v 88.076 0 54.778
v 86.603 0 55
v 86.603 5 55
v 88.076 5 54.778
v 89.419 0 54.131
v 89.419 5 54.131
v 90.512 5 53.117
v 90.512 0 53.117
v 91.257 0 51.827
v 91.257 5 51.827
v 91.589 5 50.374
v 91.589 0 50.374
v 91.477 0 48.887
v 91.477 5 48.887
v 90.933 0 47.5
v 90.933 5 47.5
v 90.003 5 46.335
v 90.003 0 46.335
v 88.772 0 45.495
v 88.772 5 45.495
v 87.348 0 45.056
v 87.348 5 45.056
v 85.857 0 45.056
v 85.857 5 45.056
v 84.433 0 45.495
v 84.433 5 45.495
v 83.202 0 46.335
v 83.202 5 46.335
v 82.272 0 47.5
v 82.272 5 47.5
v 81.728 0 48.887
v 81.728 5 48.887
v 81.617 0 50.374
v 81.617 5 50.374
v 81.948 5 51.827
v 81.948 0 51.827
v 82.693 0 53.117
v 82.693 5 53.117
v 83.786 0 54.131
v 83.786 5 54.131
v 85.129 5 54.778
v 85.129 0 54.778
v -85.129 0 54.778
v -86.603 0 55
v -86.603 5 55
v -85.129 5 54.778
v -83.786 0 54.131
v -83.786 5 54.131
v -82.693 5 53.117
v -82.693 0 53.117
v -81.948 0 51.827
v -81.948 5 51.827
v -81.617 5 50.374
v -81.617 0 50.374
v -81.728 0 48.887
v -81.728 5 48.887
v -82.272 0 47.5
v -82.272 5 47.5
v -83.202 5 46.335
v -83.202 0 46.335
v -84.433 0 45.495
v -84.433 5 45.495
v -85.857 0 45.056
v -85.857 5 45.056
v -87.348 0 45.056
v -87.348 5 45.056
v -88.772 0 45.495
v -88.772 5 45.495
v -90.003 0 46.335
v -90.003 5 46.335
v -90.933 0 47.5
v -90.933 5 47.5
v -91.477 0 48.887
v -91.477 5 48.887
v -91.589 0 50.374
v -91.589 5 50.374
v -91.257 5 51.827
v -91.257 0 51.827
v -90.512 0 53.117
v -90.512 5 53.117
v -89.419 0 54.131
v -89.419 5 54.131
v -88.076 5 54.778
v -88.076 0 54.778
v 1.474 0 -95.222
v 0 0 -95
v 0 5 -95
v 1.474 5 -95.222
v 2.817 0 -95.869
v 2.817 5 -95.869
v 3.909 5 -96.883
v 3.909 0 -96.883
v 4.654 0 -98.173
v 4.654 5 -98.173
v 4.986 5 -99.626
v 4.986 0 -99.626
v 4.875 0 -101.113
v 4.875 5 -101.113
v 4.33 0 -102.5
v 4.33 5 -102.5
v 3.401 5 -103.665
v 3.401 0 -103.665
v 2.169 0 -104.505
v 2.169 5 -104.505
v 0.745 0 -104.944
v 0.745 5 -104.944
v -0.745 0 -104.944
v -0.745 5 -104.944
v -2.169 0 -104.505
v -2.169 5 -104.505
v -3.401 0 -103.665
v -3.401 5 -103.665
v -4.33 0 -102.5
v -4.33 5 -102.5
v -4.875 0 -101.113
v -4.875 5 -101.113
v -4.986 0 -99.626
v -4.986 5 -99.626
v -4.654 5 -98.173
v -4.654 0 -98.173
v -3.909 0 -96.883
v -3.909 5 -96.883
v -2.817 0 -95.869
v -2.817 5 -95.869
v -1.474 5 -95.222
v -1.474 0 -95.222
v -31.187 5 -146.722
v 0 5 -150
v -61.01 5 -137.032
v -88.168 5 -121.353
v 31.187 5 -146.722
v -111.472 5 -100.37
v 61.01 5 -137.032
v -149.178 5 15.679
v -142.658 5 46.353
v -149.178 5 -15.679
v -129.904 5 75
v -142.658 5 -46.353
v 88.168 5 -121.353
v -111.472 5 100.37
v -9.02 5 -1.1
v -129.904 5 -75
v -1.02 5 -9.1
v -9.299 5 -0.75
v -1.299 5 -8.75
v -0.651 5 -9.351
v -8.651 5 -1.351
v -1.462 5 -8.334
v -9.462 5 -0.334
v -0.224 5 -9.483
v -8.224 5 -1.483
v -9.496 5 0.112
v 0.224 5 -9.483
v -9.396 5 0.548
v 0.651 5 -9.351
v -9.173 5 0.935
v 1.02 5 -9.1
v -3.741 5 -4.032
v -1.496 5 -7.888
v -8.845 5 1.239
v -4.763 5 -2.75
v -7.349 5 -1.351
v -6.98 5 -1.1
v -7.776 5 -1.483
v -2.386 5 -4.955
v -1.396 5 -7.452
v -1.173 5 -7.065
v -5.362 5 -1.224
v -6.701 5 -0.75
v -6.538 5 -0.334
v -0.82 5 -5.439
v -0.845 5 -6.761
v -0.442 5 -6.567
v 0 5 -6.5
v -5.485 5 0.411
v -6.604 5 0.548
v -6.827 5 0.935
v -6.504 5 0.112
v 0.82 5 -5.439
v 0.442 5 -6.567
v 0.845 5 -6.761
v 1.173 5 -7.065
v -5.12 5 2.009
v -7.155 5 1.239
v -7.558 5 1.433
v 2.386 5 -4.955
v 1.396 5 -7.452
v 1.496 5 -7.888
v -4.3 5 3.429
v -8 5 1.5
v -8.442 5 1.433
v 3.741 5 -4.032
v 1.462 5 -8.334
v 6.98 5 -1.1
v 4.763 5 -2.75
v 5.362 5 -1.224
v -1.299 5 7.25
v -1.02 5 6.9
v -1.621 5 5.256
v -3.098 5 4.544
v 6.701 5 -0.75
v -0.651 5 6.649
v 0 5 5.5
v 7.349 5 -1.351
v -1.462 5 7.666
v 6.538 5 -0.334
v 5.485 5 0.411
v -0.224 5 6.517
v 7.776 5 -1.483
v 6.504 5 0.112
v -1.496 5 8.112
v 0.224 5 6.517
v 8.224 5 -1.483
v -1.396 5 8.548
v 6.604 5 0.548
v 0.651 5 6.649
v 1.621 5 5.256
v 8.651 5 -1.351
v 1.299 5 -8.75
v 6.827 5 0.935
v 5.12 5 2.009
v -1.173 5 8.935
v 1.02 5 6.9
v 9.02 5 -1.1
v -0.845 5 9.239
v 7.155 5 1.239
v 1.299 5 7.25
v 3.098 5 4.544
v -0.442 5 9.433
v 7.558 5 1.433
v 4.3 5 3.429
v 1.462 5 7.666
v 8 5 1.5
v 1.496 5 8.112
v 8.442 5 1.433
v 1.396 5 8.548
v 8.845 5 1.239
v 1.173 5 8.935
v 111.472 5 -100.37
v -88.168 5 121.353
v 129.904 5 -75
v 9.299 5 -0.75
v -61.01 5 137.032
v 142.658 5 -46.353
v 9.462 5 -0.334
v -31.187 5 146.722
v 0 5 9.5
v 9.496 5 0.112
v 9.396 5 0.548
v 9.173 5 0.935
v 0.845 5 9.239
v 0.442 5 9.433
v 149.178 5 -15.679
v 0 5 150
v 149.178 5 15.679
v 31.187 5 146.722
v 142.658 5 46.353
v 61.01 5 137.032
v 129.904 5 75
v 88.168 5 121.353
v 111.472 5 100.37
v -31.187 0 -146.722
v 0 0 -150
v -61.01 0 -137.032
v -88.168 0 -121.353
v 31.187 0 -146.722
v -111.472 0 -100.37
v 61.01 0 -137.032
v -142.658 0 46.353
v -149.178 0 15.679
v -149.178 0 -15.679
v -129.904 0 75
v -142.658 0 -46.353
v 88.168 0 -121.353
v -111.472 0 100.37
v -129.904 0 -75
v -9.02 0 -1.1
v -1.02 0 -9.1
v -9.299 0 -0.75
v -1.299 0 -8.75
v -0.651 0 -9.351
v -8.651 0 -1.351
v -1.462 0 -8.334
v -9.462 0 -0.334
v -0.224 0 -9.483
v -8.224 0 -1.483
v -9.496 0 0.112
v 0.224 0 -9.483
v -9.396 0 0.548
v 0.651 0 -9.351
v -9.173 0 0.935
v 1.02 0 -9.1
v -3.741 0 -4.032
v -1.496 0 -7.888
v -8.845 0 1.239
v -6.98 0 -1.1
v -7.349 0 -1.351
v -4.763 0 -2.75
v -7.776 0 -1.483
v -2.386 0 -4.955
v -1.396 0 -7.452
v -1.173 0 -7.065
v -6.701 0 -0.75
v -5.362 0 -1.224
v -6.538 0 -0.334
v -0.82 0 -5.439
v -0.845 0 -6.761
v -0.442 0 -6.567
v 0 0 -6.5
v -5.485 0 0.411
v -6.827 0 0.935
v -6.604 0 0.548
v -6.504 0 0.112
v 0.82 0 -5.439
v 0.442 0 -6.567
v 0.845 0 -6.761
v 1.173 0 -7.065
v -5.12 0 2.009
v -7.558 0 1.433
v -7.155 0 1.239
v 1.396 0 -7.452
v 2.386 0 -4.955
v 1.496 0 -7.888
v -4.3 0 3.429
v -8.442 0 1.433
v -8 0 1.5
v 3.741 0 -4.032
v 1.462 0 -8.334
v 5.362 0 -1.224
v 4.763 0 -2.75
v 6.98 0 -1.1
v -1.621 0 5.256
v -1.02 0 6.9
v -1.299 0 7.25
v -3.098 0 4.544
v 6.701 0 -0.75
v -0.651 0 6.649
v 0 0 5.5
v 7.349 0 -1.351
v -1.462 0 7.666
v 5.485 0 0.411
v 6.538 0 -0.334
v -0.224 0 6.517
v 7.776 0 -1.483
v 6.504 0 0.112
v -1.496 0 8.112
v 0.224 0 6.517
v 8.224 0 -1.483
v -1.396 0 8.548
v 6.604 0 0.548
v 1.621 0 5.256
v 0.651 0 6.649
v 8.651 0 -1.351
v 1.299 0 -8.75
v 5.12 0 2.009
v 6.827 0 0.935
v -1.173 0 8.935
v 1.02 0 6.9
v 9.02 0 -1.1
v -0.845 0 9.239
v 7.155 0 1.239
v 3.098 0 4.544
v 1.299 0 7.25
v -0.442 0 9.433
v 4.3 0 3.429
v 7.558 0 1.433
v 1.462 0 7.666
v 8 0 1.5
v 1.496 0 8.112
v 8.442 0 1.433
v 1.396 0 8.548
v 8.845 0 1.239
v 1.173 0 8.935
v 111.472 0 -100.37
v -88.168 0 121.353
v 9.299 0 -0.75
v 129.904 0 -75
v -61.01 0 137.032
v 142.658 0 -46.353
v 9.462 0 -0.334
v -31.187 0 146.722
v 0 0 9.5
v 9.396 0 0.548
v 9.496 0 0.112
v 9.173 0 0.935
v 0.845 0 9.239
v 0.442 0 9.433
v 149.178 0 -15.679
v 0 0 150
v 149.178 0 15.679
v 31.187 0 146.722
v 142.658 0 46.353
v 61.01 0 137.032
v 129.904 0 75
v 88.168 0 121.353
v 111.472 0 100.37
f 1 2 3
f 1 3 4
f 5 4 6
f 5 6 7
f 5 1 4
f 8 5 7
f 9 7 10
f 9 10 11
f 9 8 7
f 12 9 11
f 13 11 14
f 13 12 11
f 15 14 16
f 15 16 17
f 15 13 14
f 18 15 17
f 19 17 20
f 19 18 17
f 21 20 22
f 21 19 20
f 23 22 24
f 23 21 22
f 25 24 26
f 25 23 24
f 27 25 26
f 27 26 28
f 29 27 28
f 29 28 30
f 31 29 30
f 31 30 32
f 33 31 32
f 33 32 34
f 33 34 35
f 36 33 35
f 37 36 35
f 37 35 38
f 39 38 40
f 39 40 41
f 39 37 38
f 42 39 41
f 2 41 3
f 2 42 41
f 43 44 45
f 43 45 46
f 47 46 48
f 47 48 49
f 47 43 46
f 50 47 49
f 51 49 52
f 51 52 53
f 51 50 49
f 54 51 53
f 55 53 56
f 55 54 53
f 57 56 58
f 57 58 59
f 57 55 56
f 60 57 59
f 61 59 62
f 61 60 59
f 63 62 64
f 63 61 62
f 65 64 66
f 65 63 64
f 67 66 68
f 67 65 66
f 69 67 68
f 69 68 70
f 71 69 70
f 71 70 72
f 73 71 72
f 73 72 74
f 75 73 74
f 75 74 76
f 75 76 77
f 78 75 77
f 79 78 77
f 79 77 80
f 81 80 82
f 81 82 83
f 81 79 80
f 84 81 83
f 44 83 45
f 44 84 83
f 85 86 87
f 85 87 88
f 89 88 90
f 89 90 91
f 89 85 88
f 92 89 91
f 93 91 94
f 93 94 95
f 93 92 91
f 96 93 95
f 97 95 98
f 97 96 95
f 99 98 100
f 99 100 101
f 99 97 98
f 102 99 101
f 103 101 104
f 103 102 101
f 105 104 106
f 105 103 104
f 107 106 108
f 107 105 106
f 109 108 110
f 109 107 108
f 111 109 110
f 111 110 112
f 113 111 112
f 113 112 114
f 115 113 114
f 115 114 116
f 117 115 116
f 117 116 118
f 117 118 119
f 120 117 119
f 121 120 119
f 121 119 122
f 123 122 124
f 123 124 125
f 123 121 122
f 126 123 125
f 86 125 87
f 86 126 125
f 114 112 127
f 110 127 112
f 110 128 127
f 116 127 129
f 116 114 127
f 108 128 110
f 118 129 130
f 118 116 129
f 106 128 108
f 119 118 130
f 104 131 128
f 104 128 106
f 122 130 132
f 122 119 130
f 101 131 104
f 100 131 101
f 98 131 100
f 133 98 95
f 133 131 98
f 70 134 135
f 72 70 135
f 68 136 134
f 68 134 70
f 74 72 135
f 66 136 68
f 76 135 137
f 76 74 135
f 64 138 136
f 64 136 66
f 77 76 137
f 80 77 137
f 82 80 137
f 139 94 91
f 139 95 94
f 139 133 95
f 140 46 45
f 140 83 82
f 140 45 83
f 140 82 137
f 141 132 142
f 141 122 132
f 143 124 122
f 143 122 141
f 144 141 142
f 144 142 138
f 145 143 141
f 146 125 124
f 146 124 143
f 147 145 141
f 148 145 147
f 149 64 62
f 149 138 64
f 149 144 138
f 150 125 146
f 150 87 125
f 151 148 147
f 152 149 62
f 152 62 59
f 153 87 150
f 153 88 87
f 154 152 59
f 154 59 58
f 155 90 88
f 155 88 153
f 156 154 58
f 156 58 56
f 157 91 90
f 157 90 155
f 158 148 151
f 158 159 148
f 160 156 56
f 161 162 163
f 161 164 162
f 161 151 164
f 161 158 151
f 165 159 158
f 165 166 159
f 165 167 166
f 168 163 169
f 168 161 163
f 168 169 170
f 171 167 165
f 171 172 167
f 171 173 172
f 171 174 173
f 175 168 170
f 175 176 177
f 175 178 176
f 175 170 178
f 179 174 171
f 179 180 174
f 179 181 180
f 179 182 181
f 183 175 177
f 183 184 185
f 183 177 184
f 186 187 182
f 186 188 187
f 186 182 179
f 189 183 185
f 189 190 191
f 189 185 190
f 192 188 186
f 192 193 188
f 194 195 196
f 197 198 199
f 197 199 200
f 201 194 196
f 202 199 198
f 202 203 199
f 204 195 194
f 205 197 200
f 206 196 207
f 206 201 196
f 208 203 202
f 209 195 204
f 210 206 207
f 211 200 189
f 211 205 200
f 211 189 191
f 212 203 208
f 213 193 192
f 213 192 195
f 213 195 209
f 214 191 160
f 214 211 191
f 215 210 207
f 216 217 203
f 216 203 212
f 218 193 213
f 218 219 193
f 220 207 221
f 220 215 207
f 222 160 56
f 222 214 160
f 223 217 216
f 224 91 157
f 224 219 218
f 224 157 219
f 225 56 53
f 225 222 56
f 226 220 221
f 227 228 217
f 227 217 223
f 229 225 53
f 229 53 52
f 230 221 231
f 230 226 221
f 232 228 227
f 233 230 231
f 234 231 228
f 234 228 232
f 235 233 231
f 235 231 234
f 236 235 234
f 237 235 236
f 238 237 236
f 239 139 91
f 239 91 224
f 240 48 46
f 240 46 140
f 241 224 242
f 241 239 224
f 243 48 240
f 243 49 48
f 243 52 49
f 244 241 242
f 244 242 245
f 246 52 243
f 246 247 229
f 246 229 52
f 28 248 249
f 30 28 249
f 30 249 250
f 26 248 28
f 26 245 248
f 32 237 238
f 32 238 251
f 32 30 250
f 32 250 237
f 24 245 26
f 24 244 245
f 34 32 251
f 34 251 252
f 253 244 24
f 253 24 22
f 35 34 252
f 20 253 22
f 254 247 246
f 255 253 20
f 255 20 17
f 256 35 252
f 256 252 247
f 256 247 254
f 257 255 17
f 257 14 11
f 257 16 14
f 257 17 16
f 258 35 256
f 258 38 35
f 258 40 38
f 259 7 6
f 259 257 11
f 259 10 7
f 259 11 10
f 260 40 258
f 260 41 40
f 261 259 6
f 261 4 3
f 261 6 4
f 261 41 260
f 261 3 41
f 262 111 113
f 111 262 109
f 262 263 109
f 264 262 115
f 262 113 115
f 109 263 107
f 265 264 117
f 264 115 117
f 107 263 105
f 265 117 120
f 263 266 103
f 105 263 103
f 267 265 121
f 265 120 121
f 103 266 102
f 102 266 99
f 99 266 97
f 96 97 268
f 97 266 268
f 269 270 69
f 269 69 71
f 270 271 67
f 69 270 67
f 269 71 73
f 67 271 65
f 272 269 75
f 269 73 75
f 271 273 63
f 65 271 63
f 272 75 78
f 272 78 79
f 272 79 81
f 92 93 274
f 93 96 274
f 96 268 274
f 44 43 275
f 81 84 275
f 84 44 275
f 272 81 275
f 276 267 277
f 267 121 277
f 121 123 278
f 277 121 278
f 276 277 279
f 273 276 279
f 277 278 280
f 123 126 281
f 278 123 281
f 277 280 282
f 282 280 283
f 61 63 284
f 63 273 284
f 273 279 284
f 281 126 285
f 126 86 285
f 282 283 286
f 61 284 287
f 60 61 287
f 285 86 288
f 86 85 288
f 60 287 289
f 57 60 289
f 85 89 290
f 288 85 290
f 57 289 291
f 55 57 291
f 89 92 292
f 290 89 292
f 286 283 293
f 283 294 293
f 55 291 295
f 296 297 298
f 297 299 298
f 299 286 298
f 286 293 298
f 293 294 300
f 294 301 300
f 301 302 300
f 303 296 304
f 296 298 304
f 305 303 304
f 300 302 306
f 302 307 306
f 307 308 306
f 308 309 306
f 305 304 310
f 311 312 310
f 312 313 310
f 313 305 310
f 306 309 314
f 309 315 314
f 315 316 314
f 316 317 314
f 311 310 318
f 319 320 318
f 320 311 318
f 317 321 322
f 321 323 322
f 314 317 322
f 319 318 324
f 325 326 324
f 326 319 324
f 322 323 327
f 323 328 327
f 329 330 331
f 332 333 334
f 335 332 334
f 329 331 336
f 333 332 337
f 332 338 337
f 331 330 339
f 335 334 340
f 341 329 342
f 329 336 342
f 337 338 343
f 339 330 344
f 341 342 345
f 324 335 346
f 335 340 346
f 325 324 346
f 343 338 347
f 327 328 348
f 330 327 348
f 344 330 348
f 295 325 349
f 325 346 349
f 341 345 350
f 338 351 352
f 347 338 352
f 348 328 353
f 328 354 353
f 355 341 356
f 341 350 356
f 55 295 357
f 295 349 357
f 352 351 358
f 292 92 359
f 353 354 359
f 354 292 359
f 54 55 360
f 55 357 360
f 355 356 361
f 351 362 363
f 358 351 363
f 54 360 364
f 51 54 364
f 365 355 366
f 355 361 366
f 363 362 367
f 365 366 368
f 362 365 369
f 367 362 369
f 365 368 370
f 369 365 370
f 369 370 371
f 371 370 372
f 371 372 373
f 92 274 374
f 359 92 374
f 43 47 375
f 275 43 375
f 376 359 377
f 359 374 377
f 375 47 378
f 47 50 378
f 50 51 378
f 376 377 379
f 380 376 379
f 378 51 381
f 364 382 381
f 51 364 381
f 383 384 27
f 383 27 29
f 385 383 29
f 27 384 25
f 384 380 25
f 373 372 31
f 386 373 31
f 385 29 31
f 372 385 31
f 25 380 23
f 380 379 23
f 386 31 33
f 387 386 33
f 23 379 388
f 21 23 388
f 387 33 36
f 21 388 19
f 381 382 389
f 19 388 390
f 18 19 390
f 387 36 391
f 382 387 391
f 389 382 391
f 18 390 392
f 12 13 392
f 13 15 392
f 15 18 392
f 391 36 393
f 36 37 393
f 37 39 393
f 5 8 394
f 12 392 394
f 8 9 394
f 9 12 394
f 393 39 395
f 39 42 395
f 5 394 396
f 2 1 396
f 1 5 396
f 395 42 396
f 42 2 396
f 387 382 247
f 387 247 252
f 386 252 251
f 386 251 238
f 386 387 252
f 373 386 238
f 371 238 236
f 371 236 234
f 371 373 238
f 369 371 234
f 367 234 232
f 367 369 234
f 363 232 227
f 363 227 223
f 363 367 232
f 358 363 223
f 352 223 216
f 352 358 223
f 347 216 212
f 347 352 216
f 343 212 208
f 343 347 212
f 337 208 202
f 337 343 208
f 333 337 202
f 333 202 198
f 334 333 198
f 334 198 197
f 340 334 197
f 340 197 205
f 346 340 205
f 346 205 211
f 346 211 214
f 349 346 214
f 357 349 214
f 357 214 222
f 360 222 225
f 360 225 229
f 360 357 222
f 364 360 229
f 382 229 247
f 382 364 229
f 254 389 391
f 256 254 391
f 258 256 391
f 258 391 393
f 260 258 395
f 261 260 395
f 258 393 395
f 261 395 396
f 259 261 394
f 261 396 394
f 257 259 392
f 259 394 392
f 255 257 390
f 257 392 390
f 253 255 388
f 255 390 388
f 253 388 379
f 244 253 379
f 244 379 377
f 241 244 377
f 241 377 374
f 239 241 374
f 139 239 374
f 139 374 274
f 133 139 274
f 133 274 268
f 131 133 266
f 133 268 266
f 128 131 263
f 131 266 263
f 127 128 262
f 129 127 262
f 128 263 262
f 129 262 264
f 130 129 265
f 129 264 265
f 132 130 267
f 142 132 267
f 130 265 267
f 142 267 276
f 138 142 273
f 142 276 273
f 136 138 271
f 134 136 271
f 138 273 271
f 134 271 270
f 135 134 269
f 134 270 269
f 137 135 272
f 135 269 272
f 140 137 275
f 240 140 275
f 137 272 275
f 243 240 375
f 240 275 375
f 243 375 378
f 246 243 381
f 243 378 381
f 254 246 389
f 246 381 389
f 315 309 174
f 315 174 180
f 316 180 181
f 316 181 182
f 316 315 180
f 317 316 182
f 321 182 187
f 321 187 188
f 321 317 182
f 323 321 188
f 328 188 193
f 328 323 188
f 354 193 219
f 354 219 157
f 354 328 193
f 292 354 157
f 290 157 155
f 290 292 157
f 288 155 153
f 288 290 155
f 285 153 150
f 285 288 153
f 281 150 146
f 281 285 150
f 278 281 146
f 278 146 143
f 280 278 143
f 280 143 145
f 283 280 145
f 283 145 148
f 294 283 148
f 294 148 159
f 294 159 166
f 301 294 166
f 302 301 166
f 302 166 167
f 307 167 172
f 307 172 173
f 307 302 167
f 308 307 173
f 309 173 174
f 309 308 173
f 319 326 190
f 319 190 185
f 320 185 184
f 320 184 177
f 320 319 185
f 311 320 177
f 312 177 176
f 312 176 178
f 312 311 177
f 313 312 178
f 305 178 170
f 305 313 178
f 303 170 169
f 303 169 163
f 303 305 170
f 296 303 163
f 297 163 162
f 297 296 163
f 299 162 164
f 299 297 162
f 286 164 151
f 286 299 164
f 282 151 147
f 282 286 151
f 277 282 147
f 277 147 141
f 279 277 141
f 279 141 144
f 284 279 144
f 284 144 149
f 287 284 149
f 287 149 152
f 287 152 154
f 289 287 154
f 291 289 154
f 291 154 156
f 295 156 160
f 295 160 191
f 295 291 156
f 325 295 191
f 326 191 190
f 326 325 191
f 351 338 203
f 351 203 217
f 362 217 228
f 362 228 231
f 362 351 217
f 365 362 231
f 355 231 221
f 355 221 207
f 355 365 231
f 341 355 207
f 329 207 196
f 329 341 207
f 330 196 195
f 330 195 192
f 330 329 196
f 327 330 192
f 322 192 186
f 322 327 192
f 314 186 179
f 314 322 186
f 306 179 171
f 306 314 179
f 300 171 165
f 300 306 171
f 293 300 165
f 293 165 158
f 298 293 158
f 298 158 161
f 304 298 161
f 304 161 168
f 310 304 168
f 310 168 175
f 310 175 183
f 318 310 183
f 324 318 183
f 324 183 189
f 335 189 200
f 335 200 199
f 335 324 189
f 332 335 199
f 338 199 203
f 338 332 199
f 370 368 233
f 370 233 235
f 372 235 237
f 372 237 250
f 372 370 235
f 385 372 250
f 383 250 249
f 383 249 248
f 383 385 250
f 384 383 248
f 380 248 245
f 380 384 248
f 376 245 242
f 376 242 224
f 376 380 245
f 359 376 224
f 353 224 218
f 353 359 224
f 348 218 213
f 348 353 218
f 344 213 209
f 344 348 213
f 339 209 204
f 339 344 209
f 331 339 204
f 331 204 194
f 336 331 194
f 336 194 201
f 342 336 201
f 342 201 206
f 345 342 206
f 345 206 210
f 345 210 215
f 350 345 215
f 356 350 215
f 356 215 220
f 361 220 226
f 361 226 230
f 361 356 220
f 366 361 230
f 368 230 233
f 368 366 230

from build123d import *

# Parameters (mm, degrees)
SKETCH_1_R      = 150
SKETCH_1_R_2    = 5
SKETCH_1_R_3    = 5.5
SKETCH_1_R_4    = 1.5
EXTRUDE_1_DEPTH = 5


with BuildPart() as part:
    # 草图1 → 凸台-拉伸1 (new body)
    with BuildSketch(Plane(origin=(0, 0, 0), x_dir=(1, 0, 0), z_dir=(0, 1, 0))):
        with Locations(Location((0, 0, 0), (0, 0, 270))):
            Circle(SKETCH_1_R)
        with Locations(Location((0, 100, 0), (0, 0, 270))):
            Circle(SKETCH_1_R_2, mode=Mode.SUBTRACT)
        with Locations(Location((-86.602540378, -50, 0), (0, 0, 270))):
            Circle(SKETCH_1_R_2, mode=Mode.SUBTRACT)
        with Locations(Location((86.602540378, -50, 0), (0, 0, 270))):
            Circle(SKETCH_1_R_2, mode=Mode.SUBTRACT)
        with Locations(Location((0, 0, 0), (0, 0, 270))):
            Circle(SKETCH_1_R_3, mode=Mode.SUBTRACT)
        with Locations(Location((0, 8, 0), (0, 0, 270))):
            Circle(SKETCH_1_R_4, mode=Mode.SUBTRACT)
        with Locations(Location((8, 0, 0), (0, 0, 270))):
            Circle(SKETCH_1_R_4, mode=Mode.SUBTRACT)
        with Locations(Location((0, -8, 0), (0, 0, 270))):
            Circle(SKETCH_1_R_4, mode=Mode.SUBTRACT)
        with Locations(Location((-8, 0, 0), (0, 0, 270))):
            Circle(SKETCH_1_R_4, mode=Mode.SUBTRACT)
    extrude(amount=EXTRUDE_1_DEPTH)


solid = part.part
